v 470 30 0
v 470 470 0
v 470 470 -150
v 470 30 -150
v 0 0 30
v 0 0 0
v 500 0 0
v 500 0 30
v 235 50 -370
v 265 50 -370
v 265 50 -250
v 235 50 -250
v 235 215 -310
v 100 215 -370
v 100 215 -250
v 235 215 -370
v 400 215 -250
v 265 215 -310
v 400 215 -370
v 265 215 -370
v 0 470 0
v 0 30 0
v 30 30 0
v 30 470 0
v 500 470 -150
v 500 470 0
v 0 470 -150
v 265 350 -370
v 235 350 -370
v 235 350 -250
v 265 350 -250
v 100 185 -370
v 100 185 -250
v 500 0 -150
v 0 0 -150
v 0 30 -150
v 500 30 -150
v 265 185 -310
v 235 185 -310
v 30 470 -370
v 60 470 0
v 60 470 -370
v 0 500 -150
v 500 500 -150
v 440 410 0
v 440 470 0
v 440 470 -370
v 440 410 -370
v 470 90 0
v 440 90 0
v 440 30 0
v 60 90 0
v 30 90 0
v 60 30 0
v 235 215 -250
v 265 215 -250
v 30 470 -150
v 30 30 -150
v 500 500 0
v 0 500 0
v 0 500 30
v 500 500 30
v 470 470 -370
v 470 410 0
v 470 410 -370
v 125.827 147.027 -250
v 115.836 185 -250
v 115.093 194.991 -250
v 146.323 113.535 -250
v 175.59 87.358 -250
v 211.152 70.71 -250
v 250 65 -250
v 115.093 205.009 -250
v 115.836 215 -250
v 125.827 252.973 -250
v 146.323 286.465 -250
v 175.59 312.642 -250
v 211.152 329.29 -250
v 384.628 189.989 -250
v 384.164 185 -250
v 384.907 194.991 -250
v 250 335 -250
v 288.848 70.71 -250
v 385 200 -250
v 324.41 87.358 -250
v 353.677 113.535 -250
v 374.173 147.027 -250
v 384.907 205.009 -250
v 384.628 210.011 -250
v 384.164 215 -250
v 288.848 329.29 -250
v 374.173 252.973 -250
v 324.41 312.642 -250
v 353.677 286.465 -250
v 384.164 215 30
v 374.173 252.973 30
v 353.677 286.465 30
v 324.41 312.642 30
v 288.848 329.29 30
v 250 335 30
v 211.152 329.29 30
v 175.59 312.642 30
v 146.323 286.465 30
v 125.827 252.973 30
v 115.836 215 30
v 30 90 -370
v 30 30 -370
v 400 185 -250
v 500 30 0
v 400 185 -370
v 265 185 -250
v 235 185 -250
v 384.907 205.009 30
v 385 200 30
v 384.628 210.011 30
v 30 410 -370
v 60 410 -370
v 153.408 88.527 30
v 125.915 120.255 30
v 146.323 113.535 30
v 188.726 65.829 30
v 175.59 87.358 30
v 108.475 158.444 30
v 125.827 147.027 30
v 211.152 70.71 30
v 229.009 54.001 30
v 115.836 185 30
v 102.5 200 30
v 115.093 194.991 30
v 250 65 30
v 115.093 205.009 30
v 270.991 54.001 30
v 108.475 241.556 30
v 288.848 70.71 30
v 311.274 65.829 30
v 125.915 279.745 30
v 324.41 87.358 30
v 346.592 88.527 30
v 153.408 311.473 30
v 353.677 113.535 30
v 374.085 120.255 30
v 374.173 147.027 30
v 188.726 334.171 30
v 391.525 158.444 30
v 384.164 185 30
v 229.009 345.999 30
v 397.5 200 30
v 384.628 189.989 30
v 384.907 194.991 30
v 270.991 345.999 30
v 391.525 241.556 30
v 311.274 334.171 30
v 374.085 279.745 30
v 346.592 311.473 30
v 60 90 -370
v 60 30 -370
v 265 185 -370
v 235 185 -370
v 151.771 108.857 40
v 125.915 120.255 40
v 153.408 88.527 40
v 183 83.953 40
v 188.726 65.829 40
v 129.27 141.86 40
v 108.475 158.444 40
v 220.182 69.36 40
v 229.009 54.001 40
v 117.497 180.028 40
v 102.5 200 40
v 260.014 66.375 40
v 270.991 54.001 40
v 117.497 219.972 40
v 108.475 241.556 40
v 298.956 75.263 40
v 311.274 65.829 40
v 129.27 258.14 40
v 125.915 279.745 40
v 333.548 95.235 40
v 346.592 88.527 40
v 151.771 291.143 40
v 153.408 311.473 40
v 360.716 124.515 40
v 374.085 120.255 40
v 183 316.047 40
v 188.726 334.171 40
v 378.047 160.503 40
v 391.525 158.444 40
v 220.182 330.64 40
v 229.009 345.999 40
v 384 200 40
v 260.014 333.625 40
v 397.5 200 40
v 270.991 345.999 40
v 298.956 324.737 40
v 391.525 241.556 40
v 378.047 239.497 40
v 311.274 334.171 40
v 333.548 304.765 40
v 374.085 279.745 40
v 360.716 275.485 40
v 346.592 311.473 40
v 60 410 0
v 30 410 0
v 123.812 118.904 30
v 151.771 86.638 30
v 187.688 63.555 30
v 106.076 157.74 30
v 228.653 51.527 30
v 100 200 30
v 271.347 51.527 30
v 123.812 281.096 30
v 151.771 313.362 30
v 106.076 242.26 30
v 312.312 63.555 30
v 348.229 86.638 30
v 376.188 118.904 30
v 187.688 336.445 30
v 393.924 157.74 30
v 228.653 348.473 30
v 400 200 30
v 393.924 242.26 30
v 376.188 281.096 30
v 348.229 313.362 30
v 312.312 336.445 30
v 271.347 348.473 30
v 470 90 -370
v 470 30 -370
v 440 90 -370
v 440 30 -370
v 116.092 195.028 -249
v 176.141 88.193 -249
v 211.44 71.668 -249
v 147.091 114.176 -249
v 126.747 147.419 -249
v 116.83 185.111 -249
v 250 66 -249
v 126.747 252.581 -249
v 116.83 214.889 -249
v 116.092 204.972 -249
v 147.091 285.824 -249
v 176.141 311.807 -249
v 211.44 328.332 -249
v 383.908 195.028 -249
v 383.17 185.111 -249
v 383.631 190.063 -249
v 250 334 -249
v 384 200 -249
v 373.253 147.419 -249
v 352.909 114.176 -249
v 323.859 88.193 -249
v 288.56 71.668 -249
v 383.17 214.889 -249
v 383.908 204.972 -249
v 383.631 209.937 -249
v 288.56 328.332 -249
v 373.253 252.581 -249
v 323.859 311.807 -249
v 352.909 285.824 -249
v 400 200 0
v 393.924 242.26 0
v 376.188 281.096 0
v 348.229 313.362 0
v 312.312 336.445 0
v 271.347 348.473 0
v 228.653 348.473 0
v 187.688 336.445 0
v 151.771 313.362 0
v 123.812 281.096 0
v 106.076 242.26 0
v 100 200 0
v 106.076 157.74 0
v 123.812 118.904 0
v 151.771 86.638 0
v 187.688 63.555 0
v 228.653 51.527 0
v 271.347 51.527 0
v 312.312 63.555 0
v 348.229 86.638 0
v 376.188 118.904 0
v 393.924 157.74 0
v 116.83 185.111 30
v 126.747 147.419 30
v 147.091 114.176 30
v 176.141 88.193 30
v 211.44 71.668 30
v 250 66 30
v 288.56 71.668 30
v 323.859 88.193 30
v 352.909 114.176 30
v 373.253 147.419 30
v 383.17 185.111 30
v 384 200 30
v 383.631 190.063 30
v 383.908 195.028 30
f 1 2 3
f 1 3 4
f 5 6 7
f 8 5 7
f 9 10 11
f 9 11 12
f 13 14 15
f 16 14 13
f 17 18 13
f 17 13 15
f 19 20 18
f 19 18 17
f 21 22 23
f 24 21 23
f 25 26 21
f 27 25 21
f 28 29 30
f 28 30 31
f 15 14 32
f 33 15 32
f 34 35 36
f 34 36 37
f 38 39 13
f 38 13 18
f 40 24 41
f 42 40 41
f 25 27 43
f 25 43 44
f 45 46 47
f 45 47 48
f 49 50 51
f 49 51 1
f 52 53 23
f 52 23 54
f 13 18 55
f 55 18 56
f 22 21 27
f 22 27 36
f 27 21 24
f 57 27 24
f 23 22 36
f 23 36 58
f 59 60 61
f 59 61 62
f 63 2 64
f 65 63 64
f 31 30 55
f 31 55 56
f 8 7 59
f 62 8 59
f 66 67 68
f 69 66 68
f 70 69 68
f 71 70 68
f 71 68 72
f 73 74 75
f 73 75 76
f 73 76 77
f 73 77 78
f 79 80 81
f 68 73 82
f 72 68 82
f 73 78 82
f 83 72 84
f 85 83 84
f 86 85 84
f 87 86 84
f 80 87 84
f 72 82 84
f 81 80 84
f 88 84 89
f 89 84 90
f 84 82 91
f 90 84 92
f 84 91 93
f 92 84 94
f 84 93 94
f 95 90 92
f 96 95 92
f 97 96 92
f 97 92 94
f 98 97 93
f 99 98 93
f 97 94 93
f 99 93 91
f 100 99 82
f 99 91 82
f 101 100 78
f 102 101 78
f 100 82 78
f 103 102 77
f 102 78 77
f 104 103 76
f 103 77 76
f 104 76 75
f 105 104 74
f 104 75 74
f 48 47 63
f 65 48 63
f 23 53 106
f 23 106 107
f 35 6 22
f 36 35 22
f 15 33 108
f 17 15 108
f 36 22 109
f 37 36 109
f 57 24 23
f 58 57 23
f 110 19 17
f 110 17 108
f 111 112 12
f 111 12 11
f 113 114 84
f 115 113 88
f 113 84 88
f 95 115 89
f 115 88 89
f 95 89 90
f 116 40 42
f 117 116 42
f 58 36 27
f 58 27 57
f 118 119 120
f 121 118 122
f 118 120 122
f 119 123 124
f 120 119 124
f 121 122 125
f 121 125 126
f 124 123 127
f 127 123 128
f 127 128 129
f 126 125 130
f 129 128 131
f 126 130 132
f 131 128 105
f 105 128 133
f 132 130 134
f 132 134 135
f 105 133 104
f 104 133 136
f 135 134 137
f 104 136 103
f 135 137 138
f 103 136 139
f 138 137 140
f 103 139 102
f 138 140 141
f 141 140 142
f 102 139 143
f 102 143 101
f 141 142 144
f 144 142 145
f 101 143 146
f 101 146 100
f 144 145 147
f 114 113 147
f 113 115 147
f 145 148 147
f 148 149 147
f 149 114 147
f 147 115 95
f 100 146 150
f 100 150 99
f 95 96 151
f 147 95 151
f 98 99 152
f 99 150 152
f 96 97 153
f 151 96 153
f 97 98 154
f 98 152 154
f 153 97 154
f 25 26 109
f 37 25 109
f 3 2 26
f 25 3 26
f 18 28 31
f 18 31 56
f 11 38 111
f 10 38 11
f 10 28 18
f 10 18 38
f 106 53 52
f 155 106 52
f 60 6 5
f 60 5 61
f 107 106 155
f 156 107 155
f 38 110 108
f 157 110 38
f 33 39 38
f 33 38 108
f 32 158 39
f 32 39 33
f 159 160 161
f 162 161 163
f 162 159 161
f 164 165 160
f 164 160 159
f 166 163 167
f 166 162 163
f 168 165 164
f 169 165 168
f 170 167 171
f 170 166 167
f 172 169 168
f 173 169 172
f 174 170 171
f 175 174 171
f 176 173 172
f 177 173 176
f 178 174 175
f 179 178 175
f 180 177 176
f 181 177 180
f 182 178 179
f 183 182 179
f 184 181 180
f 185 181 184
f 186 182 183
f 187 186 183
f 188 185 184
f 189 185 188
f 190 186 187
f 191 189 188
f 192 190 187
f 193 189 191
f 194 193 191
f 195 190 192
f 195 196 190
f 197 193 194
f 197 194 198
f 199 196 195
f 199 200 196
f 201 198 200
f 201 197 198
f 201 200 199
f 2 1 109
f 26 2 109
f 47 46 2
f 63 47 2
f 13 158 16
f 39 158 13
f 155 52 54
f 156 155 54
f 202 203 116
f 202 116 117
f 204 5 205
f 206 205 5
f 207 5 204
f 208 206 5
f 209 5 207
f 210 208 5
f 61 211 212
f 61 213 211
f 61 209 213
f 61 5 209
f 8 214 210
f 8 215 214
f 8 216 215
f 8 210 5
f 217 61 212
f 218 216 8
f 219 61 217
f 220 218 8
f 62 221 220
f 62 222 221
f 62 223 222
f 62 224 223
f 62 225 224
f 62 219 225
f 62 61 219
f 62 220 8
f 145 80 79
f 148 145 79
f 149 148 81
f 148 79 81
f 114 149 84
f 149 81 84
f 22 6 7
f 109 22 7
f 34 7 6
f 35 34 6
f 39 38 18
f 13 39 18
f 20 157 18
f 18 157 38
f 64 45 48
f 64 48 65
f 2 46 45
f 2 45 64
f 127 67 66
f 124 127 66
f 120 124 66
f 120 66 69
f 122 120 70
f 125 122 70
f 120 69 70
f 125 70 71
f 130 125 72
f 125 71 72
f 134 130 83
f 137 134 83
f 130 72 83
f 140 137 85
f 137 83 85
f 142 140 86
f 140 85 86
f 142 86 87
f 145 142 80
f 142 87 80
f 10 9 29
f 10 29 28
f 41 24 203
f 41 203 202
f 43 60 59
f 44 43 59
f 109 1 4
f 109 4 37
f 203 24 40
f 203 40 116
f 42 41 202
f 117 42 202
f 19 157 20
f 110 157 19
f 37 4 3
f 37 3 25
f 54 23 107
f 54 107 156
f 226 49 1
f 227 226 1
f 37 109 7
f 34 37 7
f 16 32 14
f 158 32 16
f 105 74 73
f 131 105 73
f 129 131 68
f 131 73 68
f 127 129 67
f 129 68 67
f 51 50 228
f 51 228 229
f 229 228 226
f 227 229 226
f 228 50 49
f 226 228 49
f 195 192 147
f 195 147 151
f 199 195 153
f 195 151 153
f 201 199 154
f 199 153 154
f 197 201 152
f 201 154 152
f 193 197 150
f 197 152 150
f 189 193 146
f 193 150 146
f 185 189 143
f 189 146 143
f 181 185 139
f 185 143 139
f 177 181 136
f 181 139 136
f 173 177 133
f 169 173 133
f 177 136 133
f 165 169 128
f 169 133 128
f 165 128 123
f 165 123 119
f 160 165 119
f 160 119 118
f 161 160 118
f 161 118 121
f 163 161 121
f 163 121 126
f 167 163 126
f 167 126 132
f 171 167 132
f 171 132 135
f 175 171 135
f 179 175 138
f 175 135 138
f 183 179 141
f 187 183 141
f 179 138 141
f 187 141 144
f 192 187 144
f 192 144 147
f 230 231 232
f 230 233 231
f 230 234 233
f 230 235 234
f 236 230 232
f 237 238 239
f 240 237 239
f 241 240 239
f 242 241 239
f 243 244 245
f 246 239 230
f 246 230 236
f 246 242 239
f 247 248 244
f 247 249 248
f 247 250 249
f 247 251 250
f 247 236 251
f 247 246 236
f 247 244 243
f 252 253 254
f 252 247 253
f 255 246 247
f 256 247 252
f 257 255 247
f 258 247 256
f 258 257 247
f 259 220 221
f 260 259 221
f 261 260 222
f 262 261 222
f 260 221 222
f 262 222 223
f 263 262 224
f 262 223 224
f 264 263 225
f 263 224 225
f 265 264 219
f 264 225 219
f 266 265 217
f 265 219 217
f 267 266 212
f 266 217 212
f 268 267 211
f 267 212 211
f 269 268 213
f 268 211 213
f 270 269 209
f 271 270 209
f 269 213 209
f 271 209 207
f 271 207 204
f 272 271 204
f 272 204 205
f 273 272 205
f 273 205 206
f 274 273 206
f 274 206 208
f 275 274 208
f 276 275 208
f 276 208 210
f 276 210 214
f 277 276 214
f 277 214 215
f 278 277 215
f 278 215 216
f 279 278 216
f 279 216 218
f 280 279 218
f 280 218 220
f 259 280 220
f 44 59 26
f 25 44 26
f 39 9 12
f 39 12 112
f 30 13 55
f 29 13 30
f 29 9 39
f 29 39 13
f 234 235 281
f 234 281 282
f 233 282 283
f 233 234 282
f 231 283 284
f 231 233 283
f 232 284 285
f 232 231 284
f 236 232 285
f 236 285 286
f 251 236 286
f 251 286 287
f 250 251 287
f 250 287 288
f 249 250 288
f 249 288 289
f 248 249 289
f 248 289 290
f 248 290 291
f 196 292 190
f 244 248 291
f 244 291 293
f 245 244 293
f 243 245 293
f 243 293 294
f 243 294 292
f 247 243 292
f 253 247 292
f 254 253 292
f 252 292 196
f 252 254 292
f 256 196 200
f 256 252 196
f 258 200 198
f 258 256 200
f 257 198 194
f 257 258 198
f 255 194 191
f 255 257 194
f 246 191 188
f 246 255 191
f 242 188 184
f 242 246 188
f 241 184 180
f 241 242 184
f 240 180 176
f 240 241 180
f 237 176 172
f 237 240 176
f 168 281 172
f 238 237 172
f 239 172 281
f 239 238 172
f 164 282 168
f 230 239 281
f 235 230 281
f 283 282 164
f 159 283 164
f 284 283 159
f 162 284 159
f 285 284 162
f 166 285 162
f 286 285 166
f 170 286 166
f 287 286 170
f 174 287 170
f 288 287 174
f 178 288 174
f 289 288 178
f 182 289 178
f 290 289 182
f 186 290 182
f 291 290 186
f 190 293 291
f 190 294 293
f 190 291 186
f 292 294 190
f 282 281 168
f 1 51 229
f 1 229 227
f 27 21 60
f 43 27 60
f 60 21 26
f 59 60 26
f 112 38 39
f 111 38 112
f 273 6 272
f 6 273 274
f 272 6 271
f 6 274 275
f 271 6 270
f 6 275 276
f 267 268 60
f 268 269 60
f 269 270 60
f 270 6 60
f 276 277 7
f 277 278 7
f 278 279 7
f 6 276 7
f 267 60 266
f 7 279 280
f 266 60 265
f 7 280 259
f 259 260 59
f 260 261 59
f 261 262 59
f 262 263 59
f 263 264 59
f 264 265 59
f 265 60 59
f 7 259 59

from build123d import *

# Parameters (mm, degrees)
F0_W      = 500
F0_H      = 500
F1_DEPTH  = 30
F2_W      = 30
F2_H      = 60
F19_DEPTH = 370
F20_DEPTH = 150
F3_W      = 30
F3_H      = 440
F4_DEPTH  = 150
F5_DEPTH  = 150
F6_R      = 150
F21_DEPTH = 400.001
F8_DEPTH  = 120
F7_W      = 135
F7_H      = 30
F9_DEPTH  = 120
F10_W     = 30
F10_H     = 60
F11_DEPTH = 265.001
F12_W     = 30
F12_H     = 60
F13_DEPTH = 315.001
F15_DEPTH = 280
F16_T     = -1
F17_R     = 147.5
F17_R_2   = 135
F17_R_3   = 134
F18_DEPTH = 10


with BuildPart() as f1:
    # F0 (on Top) → F1 (new body)
    with BuildSketch(Plane.XY):
        with Locations((250, 250)):
            Rectangle(F0_W, F0_H)
    extrude(amount=F1_DEPTH)

    # F6 (on face) → F21 (cut, through all)
    with BuildSketch(Plane.XY.offset(30)):
        with Locations((250, 200)):
            Circle(F6_R)
    extrude(amount=-F21_DEPTH, mode=Mode.SUBTRACT)


with BuildPart() as f19:
    # F2 (on face) → F19 (new body)
    with BuildSketch(Plane(origin=(0, 0, 0), x_dir=(1, 0, 0), z_dir=(0, 0, -1))):
        with Locations((45, -60)):
            Rectangle(F2_W, F2_H)
    extrude(amount=F19_DEPTH)


with BuildPart() as f19b:
    # F2 (on face) → F19, piece 2 (new body)
    with BuildSketch(Plane(origin=(0, 0, 0), x_dir=(1, 0, 0), z_dir=(0, 0, -1))):
        with Locations((455, -60)):
            Rectangle(F2_W, F2_H)
    extrude(amount=F19_DEPTH)


with BuildPart() as f19c:
    # F2 (on face) → F19, piece 3 (new body)
    with BuildSketch(Plane(origin=(0, 0, 0), x_dir=(1, 0, 0), z_dir=(0, 0, -1))):
        with Locations((455, -440)):
            Rectangle(F2_W, F2_H)
    extrude(amount=F19_DEPTH)


with BuildPart() as f19d:
    # F2 (on face) → F19, piece 4 (new body)
    with BuildSketch(Plane(origin=(0, 0, 0), x_dir=(1, 0, 0), z_dir=(0, 0, -1))):
        with Locations((45, -440)):
            Rectangle(F2_W, F2_H)
    extrude(amount=F19_DEPTH)


with BuildPart() as f20:
    # F3 (on face) → F20 (new body)
    with BuildSketch(Plane(origin=(0, 0, 0), x_dir=(1, 0, 0), z_dir=(0, 0, -1))):
        Polygon((0, 0), (0, -30), (30, -30), (470, -30), (500, -30), (500, 0), align=None)
    extrude(amount=F20_DEPTH)


with BuildPart() as f4:
    # F3 (on face) → F4 (new body)
    with BuildSketch(Plane(origin=(0, 0, 0), x_dir=(1, 0, 0), z_dir=(0, 0, -1))):
        with Locations((15, -250)):
            Rectangle(F3_W, F3_H)
    extrude(amount=F4_DEPTH)


with BuildPart() as f4b:
    # F3 (on face) → F4, piece 2 (new body)
    with BuildSketch(Plane(origin=(0, 0, 0), x_dir=(1, 0, 0), z_dir=(0, 0, -1))):
        with Locations((485, -250)):
            Rectangle(F3_W, F3_H)
    extrude(amount=F4_DEPTH)


with BuildPart() as f5:
    # F3 (on face) → F5 (new body)
    with BuildSketch(Plane(origin=(0, 0, 0), x_dir=(1, 0, 0), z_dir=(0, 0, -1))):
        Polygon((30, -470), (0, -470), (0, -500), (500, -500), (500, -470), (470, -470), align=None)
    extrude(amount=F5_DEPTH)


with BuildPart() as f8:
    # F7 (on face) → F8 (new body)
    with BuildSketch(Plane(origin=(0, 0, -370), x_dir=(1, 0, 0), z_dir=(0, 0, -1))):
        Polygon((250, -185), (265, -185), (265, -50), (235, -50), (235, -185), align=None)
        Polygon((235, -185), (235, -215), (250, -215), (250, -200), (250, -185), align=None)
        Polygon((250, -215), (265, -215), (265, -185), (250, -185), (250, -200), align=None)
        Polygon((235, -350), (265, -350), (265, -215), (250, -215), (235, -215), align=None)
    extrude(amount=-F8_DEPTH)

    # F10 (on face) → F11 (cut, through all)
    with BuildSketch(Plane.YZ.offset(265)):
        with Locations((200, -280)):
            Rectangle(F10_W, F10_H)
    extrude(amount=-F11_DEPTH, mode=Mode.SUBTRACT)


with BuildPart() as f9:
    # F7 (on face) → F9 (new body)
    with BuildSketch(Plane(origin=(0, 0, -370), x_dir=(1, 0, 0), z_dir=(0, 0, -1))):
        with Locations((167.5, -200)):
            Rectangle(F7_W, F7_H)
        Polygon((250, -215), (265, -215), (265, -185), (250, -185), (250, -200), align=None)
        Polygon((235, -185), (235, -215), (250, -215), (250, -200), (250, -185), align=None)
        with Locations((332.5, -200)):
            Rectangle(F7_W, F7_H)
    extrude(amount=-F9_DEPTH)

    # F12 (on face) → F13 (cut, through all)
    with BuildSketch(Plane.XZ.offset(-185)):
        with Locations((250, -340)):
            Rectangle(F12_W, F12_H)
    extrude(amount=-F13_DEPTH, mode=Mode.SUBTRACT)


with BuildPart() as f15:
    # F14 (on face) → F15 (new body)
    with BuildSketch(Plane.XY.offset(-250)):
        with BuildLine():
            Line((115.83592135, 215), (384.16407865, 215))
            ThreePointArc((384.16407865, 215), (250, 335), (115.83592135, 215))
        make_face()
        with BuildLine():
            ThreePointArc((115.83592135, 185), (250, 65), (384.16407865, 185))
            Line((384.16407865, 185), (115.83592135, 185))
        make_face()
        with BuildLine():
            ThreePointArc((384.16407865, 185), (384.7908576606, 192.488362953), (385, 200))
            ThreePointArc((385, 200), (384.7908576606, 207.511637047), (384.16407865, 215))
            Line((384.16407865, 215), (115.83592135, 215))
            ThreePointArc((115.83592135, 215), (115, 200), (115.83592135, 185))
            Line((115.83592135, 185), (384.16407865, 185))
        make_face()
    extrude(amount=F15_DEPTH)

    # F16
    f16_openings = [f15.faces().sort_by_distance(p)[0] for p in [
        (250, 200, 30),
    ]]
    offset(amount=F16_T, openings=f16_openings)

    # F17 (on face) → F18 (join)
    with BuildSketch(Plane.XY.offset(30)):
        with Locations((250, 200)):
            Circle(F17_R)
        with Locations((250, 200)):
            Circle(F17_R_2, mode=Mode.SUBTRACT)
        with Locations((250, 200)):
            Circle(F17_R_2)
        with Locations((250, 200)):
            Circle(F17_R_3, mode=Mode.SUBTRACT)
    extrude(amount=F18_DEPTH)


solid = Compound([f1.part, f19.part, f19b.part, f19c.part, f19d.part, f20.part, f4.part, f4b.part, f5.part, f8.part, f9.part, f15.part])
